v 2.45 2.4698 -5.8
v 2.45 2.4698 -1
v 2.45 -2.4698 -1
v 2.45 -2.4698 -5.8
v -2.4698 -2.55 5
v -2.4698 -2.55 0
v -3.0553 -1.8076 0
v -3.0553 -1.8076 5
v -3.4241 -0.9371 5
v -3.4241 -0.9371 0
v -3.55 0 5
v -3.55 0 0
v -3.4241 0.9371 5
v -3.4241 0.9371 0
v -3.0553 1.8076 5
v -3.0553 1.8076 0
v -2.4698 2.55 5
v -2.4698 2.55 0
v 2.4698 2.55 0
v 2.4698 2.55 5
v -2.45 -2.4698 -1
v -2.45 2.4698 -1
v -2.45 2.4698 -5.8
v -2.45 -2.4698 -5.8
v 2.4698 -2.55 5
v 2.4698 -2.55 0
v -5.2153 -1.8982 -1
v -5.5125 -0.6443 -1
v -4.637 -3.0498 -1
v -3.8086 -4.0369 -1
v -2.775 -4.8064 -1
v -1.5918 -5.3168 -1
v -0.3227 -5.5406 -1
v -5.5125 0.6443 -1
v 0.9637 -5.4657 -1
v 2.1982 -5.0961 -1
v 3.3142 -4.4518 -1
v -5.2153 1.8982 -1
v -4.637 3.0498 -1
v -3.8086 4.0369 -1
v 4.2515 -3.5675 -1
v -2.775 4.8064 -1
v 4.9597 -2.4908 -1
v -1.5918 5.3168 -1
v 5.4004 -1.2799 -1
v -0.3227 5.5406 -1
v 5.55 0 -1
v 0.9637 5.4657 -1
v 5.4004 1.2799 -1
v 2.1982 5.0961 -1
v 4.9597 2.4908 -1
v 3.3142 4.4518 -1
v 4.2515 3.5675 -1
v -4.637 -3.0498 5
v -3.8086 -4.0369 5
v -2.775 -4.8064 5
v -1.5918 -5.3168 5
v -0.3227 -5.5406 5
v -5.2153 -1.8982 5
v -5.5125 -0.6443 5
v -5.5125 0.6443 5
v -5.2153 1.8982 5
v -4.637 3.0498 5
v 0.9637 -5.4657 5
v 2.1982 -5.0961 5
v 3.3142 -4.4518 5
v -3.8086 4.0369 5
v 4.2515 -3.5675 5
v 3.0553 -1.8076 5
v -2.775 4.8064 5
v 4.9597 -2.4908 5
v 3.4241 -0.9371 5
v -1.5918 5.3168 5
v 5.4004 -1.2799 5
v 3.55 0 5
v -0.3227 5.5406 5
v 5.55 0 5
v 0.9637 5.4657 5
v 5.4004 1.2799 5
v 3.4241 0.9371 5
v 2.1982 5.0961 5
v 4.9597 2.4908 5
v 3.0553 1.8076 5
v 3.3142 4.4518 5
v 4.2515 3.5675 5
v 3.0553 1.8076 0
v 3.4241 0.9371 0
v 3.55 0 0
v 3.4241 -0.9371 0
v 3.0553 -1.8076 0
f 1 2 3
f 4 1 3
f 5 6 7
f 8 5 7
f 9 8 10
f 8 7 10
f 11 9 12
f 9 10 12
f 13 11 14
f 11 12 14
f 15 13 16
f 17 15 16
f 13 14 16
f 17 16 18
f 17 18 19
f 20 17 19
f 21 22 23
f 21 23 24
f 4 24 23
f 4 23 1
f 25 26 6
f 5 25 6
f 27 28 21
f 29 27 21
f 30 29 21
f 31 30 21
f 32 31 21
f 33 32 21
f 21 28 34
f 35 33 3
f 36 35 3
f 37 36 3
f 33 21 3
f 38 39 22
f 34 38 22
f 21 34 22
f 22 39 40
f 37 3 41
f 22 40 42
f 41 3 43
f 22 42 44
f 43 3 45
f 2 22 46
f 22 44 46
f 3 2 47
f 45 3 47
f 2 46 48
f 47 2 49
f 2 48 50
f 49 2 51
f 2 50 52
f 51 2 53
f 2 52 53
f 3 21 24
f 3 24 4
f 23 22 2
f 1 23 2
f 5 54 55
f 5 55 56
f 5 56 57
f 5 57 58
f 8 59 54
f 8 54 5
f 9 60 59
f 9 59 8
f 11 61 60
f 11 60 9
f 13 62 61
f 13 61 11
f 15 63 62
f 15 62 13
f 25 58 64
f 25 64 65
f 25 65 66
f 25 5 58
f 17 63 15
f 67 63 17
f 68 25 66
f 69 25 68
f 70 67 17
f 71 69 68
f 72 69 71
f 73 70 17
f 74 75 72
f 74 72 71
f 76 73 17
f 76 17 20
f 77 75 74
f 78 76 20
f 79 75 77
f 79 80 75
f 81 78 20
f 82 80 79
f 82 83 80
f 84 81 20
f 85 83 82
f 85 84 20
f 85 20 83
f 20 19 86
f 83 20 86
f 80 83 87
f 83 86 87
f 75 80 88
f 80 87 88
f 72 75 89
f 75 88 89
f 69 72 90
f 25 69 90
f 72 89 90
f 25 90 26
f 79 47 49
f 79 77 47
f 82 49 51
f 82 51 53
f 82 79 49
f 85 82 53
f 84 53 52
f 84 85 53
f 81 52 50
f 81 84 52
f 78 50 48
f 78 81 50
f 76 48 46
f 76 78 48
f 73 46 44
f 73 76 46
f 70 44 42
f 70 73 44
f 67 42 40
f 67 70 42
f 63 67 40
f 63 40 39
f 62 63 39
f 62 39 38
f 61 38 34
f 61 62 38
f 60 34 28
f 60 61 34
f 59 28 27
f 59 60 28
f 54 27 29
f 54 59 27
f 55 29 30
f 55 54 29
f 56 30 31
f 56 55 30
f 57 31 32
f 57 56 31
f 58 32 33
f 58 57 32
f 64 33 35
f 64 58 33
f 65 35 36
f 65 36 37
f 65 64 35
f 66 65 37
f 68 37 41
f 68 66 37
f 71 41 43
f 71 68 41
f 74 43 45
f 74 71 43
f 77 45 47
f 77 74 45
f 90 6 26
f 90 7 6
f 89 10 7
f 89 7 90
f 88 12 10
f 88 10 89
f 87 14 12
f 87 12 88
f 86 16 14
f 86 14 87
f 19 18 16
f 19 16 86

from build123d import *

# Parameters (mm, degrees)
F0_R     = 5.55
F1_DEPTH = 5
F0_W     = 4.939636
F0_H     = 5.1
F2_DEPTH = 1
F3_W     = 4.9
F3_H     = 4.939636
F4_DEPTH = 4.8


with BuildPart() as f1:
    # F0 (on Top) → F1 (new body)
    with BuildSketch(Plane.XY):
        Circle(F0_R)
        with BuildLine():
            ThreePointArc((-2.469818, -2.55), (-3.55, 0), (-2.469818, 2.55))
            Line((-2.469818, 2.55), (2.469818, 2.55))
            ThreePointArc((2.469818, 2.55), (3.55, 0), (2.469818, -2.55))
            Line((2.469818, -2.55), (-2.469818, -2.55))
        make_face(mode=Mode.SUBTRACT)
    extrude(amount=F1_DEPTH)

    # F0 (on Top) → F2 (join)
    with BuildSketch(Plane.XY):
        Circle(F0_R)
        with BuildLine():
            ThreePointArc((-2.469818, -2.55), (-3.55, 0), (-2.469818, 2.55))
            Line((-2.469818, 2.55), (2.469818, 2.55))
            ThreePointArc((2.469818, 2.55), (3.55, 0), (2.469818, -2.55))
            Line((2.469818, -2.55), (-2.469818, -2.55))
        make_face(mode=Mode.SUBTRACT)
        with BuildLine():
            ThreePointArc((2.469818, -2.55), (3.55, 0), (2.469818, 2.55))
            Line((2.469818, 2.55), (2.469818, -2.55))
        make_face()
        Rectangle(F0_W, F0_H)
        with BuildLine():
            Line((-2.469818, -2.55), (-2.469818, 2.55))
            ThreePointArc((-2.469818, 2.55), (-3.55, 0), (-2.469818, -2.55))
        make_face()
    extrude(amount=-F2_DEPTH)

    # F3 (on face) → F4 (join)
    with BuildSketch(Plane(origin=(0, 0, -1), x_dir=(1, 0, 0), z_dir=(0, 0, -1))):
        Rectangle(F3_W, F3_H)
    extrude(amount=F4_DEPTH)


solid = f1.part
